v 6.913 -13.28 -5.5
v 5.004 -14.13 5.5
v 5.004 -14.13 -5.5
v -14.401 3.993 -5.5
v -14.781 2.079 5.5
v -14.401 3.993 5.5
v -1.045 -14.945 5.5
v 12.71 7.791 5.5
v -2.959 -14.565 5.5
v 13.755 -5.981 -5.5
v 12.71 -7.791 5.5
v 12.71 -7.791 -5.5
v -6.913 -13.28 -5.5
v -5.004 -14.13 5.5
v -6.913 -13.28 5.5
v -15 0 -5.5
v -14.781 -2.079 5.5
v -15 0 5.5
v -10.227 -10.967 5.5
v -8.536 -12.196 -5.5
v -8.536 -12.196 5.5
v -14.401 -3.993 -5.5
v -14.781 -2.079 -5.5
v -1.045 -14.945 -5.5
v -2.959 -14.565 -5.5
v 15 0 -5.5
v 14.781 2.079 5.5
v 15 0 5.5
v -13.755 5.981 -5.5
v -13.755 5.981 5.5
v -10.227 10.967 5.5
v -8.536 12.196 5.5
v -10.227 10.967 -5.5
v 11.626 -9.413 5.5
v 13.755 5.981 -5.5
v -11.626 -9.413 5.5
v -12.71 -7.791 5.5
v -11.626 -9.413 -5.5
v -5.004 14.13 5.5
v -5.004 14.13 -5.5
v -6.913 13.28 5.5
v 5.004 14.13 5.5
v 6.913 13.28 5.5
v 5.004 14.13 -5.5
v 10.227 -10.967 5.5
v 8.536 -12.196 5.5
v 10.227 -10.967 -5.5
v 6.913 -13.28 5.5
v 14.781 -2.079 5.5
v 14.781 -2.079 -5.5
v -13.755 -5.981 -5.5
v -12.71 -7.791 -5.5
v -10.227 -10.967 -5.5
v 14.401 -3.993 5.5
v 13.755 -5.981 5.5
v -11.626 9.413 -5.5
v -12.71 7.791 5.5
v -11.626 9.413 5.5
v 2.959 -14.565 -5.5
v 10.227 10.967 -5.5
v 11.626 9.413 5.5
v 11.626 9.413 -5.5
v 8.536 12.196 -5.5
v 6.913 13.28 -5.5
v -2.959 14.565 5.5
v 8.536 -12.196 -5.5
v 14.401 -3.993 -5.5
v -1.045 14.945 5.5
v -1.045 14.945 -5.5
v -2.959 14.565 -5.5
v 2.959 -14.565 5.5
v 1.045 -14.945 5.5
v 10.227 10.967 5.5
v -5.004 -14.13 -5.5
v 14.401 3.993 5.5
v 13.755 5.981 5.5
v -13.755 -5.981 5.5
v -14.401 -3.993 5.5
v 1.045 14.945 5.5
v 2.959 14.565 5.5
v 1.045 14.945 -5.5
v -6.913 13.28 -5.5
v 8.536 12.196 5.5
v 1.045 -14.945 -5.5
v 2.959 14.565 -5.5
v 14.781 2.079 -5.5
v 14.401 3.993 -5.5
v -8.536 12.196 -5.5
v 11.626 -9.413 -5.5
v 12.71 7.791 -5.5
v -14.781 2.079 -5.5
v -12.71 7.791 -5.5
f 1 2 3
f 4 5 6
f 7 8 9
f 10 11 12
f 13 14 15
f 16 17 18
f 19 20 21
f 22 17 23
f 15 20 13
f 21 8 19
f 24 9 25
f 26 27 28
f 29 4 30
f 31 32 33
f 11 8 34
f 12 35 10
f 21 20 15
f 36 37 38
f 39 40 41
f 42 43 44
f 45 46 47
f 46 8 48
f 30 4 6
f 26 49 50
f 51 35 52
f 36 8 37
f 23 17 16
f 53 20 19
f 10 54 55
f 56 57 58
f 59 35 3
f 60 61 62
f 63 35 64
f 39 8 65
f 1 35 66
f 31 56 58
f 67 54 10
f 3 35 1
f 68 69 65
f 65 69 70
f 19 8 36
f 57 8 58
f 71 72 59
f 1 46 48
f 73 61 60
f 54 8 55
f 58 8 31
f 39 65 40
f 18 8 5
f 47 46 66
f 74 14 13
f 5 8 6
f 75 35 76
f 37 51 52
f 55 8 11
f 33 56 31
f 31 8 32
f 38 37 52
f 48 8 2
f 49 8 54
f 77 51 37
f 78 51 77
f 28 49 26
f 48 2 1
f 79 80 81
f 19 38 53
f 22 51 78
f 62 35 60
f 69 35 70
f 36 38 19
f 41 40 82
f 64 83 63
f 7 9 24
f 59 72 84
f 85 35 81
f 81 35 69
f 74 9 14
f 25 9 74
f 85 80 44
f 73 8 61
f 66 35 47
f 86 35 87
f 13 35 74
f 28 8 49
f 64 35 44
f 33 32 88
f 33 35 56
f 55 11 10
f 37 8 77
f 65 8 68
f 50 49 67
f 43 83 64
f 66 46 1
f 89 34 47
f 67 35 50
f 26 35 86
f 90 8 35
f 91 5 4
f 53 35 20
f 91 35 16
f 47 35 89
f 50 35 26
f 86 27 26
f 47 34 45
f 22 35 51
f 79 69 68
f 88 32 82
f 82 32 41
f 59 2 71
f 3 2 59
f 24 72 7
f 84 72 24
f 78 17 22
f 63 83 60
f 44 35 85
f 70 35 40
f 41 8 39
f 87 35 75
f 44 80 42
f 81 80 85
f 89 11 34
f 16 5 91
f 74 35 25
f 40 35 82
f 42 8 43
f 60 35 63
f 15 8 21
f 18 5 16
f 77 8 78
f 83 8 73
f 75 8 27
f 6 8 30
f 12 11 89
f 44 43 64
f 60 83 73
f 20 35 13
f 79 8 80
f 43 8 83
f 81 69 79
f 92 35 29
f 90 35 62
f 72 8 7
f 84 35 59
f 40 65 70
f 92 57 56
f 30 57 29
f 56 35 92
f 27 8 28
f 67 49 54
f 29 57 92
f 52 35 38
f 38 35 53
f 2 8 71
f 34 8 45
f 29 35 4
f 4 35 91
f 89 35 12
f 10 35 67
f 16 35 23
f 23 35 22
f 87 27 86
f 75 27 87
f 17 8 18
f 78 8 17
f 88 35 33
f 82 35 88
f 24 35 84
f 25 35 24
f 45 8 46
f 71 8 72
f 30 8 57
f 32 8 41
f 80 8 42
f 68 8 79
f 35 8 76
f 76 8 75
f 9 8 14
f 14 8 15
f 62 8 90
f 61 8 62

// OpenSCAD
minkowski()
{
cylinder(d=10,h=10,center=true);
cylinder(d=20,h=1,center=true);
}
